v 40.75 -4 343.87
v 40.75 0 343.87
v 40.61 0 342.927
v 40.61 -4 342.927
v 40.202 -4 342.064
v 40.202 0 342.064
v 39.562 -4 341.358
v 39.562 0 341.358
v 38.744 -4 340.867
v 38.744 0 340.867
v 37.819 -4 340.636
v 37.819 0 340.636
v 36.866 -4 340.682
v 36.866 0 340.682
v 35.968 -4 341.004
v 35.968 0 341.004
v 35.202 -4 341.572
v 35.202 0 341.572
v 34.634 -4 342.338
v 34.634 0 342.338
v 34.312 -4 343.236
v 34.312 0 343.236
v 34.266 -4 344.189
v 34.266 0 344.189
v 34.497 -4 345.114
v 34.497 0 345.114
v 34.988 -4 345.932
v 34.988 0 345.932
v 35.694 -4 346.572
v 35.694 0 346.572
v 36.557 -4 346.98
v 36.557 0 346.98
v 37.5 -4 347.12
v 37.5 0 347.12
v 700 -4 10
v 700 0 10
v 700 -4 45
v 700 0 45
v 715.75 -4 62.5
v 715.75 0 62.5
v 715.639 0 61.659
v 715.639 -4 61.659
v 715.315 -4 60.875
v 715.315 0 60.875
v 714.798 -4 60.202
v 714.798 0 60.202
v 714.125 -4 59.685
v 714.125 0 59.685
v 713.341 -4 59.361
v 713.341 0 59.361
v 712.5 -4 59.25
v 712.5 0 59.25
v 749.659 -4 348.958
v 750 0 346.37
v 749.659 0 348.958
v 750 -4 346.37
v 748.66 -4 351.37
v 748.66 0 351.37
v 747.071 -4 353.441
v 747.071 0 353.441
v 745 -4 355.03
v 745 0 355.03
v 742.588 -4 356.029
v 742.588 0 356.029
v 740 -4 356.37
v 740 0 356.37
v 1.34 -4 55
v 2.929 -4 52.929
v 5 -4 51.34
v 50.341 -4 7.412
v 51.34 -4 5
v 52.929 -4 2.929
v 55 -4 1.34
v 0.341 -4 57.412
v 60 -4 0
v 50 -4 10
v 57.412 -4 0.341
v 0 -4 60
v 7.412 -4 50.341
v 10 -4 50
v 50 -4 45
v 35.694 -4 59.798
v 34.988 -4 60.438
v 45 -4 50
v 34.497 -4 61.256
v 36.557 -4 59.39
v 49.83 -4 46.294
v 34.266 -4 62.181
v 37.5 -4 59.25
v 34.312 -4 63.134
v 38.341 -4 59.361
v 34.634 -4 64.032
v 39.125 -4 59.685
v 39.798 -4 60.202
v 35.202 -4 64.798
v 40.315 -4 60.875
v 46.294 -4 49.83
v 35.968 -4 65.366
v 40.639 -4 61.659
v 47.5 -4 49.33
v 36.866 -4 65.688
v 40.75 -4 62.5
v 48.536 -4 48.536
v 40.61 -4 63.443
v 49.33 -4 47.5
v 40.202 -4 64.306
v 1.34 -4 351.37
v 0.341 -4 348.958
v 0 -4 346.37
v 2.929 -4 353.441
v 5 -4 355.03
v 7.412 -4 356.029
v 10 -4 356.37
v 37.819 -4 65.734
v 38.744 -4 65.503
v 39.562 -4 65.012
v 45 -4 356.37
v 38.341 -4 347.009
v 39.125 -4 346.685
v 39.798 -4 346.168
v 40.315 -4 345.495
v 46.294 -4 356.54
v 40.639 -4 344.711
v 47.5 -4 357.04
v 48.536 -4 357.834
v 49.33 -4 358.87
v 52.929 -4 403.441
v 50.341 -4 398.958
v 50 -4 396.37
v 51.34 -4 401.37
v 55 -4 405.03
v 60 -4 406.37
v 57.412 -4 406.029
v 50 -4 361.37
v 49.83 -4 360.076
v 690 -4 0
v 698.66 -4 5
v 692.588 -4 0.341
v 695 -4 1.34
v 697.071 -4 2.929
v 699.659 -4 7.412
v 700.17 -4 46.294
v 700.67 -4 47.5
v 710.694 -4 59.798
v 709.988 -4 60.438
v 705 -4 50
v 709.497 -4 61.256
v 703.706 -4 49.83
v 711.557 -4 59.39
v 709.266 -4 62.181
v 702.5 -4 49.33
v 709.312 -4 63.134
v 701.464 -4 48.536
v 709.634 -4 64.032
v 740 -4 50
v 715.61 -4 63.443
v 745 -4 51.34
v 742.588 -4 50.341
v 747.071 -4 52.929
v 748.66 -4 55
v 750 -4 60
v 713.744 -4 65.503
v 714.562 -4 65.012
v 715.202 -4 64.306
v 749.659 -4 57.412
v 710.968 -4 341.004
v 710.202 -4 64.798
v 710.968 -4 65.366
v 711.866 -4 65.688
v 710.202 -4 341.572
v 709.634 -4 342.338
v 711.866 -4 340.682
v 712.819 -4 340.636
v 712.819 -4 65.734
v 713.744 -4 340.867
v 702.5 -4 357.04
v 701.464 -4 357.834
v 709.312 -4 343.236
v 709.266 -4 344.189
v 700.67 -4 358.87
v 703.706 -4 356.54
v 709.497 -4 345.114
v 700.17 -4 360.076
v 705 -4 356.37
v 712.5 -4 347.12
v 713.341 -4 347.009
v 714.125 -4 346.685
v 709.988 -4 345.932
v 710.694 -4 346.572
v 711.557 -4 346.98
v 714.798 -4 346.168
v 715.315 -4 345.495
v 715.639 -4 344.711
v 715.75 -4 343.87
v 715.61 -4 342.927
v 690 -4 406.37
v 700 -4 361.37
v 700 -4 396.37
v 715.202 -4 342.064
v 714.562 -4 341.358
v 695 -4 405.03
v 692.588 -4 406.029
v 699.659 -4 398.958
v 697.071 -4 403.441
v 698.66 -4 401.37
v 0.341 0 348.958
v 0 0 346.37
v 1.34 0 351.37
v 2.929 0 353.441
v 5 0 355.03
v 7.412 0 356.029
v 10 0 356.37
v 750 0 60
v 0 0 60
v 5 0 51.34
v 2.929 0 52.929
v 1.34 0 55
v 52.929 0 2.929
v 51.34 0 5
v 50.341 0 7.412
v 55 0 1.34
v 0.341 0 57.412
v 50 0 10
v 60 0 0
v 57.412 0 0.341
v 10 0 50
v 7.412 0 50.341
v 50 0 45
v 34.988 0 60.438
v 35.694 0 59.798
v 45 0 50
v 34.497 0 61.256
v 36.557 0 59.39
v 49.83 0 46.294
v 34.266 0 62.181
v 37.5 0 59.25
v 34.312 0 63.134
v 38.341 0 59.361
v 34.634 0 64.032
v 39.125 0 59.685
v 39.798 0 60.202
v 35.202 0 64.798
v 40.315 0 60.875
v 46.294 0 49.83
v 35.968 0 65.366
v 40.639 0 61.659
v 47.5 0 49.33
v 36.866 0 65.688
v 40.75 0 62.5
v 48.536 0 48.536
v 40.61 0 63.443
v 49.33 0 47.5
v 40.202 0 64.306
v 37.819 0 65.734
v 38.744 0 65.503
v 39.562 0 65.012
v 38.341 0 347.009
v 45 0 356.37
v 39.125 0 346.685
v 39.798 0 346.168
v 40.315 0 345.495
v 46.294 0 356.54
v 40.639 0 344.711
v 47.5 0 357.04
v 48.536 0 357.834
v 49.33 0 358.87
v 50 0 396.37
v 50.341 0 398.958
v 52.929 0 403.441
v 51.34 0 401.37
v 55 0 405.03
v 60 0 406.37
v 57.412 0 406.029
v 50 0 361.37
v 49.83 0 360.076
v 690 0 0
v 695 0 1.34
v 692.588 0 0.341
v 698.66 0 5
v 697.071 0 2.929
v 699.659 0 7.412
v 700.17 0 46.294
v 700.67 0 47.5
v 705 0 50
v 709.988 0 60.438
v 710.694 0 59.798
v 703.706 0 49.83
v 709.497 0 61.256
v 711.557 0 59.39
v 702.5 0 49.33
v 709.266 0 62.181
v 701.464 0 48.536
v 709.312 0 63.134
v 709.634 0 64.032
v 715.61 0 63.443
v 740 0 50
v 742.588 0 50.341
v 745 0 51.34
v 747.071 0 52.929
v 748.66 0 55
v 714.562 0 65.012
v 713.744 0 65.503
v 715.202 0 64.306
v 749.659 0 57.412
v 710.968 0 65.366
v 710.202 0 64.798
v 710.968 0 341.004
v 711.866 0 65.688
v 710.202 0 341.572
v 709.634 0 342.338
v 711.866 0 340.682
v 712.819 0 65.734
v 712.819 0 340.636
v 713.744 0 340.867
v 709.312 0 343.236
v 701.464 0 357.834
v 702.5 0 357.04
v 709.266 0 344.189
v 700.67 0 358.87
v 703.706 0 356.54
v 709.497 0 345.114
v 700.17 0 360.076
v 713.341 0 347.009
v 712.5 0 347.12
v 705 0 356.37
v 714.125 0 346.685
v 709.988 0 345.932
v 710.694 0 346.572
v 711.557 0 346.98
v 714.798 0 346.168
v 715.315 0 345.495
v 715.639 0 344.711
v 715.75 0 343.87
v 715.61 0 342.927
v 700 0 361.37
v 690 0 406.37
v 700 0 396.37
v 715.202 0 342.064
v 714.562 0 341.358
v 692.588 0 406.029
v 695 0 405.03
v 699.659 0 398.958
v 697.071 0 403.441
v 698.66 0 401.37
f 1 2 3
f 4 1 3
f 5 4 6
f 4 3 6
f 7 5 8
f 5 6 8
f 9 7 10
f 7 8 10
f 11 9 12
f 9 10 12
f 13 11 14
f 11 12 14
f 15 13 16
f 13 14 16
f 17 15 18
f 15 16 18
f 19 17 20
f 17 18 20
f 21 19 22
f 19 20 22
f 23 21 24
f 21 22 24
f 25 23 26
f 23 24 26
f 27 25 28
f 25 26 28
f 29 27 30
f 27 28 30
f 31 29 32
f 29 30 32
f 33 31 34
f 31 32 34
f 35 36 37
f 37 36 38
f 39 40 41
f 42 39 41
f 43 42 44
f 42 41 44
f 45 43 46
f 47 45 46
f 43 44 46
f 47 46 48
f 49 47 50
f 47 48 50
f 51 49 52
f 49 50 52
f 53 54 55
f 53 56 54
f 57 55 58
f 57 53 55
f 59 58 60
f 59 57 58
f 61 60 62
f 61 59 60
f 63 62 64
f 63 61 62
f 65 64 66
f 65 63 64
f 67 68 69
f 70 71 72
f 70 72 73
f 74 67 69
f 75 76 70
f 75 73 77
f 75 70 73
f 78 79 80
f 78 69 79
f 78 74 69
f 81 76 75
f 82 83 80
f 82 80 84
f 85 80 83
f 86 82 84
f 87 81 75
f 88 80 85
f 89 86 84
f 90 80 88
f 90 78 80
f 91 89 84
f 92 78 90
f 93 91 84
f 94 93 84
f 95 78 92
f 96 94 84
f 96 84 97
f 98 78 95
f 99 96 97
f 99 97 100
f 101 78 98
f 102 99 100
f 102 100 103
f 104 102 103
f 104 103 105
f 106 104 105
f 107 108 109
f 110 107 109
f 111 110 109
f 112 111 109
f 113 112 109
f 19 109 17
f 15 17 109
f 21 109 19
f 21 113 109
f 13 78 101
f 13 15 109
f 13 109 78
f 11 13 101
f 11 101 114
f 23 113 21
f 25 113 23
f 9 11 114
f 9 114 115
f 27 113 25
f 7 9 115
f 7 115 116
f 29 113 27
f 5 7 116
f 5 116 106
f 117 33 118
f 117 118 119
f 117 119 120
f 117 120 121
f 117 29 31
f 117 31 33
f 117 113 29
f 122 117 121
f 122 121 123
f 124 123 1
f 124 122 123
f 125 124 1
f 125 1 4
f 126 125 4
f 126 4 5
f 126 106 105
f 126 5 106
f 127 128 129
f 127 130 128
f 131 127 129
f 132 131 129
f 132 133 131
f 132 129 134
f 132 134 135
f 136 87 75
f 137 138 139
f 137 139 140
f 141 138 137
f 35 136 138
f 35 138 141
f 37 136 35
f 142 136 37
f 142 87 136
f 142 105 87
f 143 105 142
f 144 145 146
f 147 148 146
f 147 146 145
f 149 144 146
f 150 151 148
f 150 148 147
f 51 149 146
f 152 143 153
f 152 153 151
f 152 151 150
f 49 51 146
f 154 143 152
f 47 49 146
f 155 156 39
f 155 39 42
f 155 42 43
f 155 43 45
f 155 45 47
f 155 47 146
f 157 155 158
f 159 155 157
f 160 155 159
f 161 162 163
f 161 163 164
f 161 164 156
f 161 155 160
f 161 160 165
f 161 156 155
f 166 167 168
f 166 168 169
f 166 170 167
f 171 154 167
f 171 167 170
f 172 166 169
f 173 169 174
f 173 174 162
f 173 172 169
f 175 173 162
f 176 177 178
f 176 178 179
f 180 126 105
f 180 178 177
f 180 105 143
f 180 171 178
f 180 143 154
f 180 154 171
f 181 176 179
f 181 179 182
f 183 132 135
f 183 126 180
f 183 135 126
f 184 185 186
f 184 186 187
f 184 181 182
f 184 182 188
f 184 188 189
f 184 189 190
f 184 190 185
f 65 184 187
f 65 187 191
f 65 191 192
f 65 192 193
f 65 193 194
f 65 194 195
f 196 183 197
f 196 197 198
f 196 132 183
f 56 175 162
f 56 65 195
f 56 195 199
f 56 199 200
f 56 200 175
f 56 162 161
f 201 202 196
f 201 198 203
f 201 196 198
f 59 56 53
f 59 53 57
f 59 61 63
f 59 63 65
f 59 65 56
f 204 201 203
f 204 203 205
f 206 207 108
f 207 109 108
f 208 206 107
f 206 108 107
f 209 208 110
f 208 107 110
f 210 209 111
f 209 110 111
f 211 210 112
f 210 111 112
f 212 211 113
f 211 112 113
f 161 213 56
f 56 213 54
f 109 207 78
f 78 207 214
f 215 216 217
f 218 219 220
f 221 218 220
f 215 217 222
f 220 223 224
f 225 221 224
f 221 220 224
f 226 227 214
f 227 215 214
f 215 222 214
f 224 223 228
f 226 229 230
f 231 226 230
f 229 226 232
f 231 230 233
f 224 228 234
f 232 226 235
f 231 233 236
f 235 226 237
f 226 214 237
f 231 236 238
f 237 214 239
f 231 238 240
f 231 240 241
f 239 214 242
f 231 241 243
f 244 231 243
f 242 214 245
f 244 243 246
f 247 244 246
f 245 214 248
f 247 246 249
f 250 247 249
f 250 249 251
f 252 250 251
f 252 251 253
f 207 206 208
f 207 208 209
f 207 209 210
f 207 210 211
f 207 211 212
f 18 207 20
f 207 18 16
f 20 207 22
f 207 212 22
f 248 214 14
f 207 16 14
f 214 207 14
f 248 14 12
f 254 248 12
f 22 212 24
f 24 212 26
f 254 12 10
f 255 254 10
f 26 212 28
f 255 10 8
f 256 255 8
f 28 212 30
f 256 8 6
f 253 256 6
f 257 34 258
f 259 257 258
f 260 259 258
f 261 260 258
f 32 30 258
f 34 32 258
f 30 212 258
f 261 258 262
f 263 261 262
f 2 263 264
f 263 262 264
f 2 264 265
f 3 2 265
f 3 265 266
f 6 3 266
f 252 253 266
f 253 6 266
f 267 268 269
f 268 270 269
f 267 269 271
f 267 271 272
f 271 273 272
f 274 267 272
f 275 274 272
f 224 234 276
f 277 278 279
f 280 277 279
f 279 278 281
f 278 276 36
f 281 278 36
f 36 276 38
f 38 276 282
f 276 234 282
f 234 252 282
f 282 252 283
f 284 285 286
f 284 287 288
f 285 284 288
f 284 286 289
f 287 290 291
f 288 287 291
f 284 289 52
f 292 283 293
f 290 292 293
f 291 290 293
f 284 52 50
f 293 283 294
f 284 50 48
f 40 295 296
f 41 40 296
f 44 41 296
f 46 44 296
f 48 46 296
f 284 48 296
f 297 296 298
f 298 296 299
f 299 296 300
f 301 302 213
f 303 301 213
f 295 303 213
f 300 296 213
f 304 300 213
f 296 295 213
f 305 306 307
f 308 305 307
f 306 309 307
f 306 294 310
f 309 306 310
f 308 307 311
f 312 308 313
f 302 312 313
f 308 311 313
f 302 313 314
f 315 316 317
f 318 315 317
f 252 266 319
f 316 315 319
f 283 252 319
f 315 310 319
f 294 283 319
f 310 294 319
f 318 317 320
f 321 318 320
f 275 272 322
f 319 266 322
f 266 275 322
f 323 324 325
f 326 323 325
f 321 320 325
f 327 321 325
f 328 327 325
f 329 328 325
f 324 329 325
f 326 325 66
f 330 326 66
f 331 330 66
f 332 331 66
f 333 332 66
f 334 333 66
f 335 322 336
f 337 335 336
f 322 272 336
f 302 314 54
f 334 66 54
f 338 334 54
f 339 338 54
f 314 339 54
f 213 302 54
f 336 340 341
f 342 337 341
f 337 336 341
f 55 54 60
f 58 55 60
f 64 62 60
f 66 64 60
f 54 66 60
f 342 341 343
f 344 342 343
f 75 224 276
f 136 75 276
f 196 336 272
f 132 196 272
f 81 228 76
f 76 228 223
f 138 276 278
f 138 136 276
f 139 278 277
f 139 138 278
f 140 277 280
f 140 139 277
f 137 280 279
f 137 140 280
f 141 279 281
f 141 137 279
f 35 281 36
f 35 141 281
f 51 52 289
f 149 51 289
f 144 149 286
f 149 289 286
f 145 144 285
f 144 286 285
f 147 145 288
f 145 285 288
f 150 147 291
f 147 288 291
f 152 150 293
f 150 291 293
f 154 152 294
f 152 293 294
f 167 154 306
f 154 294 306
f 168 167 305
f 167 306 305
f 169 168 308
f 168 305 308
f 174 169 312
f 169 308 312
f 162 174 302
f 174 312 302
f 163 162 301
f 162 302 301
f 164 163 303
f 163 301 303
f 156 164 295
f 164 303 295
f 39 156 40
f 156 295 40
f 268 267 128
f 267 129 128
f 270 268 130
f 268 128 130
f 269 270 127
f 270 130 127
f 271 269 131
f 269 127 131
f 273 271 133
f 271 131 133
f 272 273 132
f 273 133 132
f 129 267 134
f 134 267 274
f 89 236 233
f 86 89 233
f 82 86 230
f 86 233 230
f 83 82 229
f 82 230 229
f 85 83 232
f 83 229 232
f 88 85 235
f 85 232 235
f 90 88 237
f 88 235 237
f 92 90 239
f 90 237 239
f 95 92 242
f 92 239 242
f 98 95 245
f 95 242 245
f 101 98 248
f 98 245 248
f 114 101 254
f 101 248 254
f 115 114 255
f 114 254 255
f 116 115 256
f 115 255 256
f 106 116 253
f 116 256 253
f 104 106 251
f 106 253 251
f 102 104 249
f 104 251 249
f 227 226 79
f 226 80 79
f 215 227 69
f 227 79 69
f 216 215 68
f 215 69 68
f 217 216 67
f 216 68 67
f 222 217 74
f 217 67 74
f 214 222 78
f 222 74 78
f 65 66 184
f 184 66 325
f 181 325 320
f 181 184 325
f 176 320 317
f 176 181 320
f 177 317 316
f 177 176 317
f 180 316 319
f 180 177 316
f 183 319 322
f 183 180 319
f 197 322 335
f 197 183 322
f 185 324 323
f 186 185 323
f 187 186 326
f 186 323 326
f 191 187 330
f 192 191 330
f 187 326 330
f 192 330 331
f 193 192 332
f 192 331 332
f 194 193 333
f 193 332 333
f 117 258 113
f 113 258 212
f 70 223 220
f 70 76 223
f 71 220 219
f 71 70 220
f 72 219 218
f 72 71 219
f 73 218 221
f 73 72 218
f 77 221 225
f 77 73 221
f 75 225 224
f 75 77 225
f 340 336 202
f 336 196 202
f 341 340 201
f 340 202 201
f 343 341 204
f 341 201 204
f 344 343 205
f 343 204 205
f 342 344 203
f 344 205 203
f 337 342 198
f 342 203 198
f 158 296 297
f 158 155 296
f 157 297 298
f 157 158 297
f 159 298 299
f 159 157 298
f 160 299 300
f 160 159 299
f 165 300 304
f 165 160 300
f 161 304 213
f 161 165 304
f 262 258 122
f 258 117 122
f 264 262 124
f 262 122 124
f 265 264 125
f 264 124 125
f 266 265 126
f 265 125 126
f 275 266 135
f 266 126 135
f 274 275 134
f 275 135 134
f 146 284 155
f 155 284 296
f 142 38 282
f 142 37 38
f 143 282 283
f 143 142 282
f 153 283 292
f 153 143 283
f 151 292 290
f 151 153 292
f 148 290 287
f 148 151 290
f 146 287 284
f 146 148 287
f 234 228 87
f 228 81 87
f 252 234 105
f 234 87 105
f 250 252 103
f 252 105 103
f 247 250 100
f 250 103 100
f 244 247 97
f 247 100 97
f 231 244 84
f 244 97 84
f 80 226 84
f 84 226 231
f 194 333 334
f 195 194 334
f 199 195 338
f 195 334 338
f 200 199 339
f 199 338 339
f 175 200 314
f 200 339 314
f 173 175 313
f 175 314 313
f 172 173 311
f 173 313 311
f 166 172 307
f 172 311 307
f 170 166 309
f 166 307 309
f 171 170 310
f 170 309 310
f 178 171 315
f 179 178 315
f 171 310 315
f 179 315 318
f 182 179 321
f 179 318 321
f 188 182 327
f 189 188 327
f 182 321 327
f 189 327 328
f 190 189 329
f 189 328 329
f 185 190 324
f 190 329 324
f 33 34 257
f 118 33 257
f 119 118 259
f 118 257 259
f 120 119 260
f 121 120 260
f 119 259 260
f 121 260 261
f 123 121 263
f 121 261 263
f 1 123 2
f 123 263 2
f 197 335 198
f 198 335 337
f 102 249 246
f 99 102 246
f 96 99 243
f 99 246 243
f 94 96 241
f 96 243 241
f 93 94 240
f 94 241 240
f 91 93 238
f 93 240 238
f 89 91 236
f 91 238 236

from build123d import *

# Parameters (mm, degrees)
F1_DEPTH = 4
F2_R     = 10
F3_R     = 5


with BuildPart() as f1:
    # F0 (on Front) → F1 (new body)
    with BuildSketch(Plane.XZ):
        Polygon((50, 50), (50, 0), (700, 0), (700, 50), (712.5, 50), (750, 50), (750, 356.37), (712.5, 356.37), (700, 356.37), (700, 406.37), (50, 406.37), (50, 356.37), (37.5, 356.37), (0, 356.37), (0, 50), (37.5, 50), align=None)
        with BuildLine():
            ThreePointArc((40.75, 62.5), (39.798097, 60.201903), (37.5, 59.25))
            ThreePointArc((37.5, 59.25), (35.201903, 64.798097), (40.75, 62.5))
        make_face(mode=Mode.SUBTRACT)
        with BuildLine():
            ThreePointArc((715.75, 62.5), (714.798097, 60.201903), (712.5, 59.25))
            ThreePointArc((712.5, 59.25), (710.201903, 64.798097), (715.75, 62.5))
        make_face(mode=Mode.SUBTRACT)
        with BuildLine():
            ThreePointArc((40.75, 343.87), (35.201903, 341.571903), (37.5, 347.12))
            ThreePointArc((37.5, 347.12), (39.798097, 346.168097), (40.75, 343.87))
        make_face(mode=Mode.SUBTRACT)
        with BuildLine():
            ThreePointArc((715.75, 343.87), (710.201903, 341.571903), (712.5, 347.12))
            ThreePointArc((712.5, 347.12), (714.798097, 346.168097), (715.75, 343.87))
        make_face(mode=Mode.SUBTRACT)
    extrude(amount=F1_DEPTH)

    # F2
    f2_edges = [f1.edges().sort_by_distance(p)[0] for p in [
        (0, -2, 356.37),
        (50, -2, 406.37),
        (0, -2, 50),
        (50, -2, 0),
        (700, -2, 0),
        (750, -2, 50),
        (750, -2, 356.37),
        (700, -2, 406.37),
    ]]
    fillet(f2_edges, radius=F2_R)

    # F3
    f3_edges = [f1.edges().sort_by_distance(p)[0] for p in [
        (700, -2, 356.37),
        (700, -2, 50),
        (50, -2, 50),
        (50, -2, 356.37),
    ]]
    fillet(f3_edges, radius=F3_R)


solid = f1.part
